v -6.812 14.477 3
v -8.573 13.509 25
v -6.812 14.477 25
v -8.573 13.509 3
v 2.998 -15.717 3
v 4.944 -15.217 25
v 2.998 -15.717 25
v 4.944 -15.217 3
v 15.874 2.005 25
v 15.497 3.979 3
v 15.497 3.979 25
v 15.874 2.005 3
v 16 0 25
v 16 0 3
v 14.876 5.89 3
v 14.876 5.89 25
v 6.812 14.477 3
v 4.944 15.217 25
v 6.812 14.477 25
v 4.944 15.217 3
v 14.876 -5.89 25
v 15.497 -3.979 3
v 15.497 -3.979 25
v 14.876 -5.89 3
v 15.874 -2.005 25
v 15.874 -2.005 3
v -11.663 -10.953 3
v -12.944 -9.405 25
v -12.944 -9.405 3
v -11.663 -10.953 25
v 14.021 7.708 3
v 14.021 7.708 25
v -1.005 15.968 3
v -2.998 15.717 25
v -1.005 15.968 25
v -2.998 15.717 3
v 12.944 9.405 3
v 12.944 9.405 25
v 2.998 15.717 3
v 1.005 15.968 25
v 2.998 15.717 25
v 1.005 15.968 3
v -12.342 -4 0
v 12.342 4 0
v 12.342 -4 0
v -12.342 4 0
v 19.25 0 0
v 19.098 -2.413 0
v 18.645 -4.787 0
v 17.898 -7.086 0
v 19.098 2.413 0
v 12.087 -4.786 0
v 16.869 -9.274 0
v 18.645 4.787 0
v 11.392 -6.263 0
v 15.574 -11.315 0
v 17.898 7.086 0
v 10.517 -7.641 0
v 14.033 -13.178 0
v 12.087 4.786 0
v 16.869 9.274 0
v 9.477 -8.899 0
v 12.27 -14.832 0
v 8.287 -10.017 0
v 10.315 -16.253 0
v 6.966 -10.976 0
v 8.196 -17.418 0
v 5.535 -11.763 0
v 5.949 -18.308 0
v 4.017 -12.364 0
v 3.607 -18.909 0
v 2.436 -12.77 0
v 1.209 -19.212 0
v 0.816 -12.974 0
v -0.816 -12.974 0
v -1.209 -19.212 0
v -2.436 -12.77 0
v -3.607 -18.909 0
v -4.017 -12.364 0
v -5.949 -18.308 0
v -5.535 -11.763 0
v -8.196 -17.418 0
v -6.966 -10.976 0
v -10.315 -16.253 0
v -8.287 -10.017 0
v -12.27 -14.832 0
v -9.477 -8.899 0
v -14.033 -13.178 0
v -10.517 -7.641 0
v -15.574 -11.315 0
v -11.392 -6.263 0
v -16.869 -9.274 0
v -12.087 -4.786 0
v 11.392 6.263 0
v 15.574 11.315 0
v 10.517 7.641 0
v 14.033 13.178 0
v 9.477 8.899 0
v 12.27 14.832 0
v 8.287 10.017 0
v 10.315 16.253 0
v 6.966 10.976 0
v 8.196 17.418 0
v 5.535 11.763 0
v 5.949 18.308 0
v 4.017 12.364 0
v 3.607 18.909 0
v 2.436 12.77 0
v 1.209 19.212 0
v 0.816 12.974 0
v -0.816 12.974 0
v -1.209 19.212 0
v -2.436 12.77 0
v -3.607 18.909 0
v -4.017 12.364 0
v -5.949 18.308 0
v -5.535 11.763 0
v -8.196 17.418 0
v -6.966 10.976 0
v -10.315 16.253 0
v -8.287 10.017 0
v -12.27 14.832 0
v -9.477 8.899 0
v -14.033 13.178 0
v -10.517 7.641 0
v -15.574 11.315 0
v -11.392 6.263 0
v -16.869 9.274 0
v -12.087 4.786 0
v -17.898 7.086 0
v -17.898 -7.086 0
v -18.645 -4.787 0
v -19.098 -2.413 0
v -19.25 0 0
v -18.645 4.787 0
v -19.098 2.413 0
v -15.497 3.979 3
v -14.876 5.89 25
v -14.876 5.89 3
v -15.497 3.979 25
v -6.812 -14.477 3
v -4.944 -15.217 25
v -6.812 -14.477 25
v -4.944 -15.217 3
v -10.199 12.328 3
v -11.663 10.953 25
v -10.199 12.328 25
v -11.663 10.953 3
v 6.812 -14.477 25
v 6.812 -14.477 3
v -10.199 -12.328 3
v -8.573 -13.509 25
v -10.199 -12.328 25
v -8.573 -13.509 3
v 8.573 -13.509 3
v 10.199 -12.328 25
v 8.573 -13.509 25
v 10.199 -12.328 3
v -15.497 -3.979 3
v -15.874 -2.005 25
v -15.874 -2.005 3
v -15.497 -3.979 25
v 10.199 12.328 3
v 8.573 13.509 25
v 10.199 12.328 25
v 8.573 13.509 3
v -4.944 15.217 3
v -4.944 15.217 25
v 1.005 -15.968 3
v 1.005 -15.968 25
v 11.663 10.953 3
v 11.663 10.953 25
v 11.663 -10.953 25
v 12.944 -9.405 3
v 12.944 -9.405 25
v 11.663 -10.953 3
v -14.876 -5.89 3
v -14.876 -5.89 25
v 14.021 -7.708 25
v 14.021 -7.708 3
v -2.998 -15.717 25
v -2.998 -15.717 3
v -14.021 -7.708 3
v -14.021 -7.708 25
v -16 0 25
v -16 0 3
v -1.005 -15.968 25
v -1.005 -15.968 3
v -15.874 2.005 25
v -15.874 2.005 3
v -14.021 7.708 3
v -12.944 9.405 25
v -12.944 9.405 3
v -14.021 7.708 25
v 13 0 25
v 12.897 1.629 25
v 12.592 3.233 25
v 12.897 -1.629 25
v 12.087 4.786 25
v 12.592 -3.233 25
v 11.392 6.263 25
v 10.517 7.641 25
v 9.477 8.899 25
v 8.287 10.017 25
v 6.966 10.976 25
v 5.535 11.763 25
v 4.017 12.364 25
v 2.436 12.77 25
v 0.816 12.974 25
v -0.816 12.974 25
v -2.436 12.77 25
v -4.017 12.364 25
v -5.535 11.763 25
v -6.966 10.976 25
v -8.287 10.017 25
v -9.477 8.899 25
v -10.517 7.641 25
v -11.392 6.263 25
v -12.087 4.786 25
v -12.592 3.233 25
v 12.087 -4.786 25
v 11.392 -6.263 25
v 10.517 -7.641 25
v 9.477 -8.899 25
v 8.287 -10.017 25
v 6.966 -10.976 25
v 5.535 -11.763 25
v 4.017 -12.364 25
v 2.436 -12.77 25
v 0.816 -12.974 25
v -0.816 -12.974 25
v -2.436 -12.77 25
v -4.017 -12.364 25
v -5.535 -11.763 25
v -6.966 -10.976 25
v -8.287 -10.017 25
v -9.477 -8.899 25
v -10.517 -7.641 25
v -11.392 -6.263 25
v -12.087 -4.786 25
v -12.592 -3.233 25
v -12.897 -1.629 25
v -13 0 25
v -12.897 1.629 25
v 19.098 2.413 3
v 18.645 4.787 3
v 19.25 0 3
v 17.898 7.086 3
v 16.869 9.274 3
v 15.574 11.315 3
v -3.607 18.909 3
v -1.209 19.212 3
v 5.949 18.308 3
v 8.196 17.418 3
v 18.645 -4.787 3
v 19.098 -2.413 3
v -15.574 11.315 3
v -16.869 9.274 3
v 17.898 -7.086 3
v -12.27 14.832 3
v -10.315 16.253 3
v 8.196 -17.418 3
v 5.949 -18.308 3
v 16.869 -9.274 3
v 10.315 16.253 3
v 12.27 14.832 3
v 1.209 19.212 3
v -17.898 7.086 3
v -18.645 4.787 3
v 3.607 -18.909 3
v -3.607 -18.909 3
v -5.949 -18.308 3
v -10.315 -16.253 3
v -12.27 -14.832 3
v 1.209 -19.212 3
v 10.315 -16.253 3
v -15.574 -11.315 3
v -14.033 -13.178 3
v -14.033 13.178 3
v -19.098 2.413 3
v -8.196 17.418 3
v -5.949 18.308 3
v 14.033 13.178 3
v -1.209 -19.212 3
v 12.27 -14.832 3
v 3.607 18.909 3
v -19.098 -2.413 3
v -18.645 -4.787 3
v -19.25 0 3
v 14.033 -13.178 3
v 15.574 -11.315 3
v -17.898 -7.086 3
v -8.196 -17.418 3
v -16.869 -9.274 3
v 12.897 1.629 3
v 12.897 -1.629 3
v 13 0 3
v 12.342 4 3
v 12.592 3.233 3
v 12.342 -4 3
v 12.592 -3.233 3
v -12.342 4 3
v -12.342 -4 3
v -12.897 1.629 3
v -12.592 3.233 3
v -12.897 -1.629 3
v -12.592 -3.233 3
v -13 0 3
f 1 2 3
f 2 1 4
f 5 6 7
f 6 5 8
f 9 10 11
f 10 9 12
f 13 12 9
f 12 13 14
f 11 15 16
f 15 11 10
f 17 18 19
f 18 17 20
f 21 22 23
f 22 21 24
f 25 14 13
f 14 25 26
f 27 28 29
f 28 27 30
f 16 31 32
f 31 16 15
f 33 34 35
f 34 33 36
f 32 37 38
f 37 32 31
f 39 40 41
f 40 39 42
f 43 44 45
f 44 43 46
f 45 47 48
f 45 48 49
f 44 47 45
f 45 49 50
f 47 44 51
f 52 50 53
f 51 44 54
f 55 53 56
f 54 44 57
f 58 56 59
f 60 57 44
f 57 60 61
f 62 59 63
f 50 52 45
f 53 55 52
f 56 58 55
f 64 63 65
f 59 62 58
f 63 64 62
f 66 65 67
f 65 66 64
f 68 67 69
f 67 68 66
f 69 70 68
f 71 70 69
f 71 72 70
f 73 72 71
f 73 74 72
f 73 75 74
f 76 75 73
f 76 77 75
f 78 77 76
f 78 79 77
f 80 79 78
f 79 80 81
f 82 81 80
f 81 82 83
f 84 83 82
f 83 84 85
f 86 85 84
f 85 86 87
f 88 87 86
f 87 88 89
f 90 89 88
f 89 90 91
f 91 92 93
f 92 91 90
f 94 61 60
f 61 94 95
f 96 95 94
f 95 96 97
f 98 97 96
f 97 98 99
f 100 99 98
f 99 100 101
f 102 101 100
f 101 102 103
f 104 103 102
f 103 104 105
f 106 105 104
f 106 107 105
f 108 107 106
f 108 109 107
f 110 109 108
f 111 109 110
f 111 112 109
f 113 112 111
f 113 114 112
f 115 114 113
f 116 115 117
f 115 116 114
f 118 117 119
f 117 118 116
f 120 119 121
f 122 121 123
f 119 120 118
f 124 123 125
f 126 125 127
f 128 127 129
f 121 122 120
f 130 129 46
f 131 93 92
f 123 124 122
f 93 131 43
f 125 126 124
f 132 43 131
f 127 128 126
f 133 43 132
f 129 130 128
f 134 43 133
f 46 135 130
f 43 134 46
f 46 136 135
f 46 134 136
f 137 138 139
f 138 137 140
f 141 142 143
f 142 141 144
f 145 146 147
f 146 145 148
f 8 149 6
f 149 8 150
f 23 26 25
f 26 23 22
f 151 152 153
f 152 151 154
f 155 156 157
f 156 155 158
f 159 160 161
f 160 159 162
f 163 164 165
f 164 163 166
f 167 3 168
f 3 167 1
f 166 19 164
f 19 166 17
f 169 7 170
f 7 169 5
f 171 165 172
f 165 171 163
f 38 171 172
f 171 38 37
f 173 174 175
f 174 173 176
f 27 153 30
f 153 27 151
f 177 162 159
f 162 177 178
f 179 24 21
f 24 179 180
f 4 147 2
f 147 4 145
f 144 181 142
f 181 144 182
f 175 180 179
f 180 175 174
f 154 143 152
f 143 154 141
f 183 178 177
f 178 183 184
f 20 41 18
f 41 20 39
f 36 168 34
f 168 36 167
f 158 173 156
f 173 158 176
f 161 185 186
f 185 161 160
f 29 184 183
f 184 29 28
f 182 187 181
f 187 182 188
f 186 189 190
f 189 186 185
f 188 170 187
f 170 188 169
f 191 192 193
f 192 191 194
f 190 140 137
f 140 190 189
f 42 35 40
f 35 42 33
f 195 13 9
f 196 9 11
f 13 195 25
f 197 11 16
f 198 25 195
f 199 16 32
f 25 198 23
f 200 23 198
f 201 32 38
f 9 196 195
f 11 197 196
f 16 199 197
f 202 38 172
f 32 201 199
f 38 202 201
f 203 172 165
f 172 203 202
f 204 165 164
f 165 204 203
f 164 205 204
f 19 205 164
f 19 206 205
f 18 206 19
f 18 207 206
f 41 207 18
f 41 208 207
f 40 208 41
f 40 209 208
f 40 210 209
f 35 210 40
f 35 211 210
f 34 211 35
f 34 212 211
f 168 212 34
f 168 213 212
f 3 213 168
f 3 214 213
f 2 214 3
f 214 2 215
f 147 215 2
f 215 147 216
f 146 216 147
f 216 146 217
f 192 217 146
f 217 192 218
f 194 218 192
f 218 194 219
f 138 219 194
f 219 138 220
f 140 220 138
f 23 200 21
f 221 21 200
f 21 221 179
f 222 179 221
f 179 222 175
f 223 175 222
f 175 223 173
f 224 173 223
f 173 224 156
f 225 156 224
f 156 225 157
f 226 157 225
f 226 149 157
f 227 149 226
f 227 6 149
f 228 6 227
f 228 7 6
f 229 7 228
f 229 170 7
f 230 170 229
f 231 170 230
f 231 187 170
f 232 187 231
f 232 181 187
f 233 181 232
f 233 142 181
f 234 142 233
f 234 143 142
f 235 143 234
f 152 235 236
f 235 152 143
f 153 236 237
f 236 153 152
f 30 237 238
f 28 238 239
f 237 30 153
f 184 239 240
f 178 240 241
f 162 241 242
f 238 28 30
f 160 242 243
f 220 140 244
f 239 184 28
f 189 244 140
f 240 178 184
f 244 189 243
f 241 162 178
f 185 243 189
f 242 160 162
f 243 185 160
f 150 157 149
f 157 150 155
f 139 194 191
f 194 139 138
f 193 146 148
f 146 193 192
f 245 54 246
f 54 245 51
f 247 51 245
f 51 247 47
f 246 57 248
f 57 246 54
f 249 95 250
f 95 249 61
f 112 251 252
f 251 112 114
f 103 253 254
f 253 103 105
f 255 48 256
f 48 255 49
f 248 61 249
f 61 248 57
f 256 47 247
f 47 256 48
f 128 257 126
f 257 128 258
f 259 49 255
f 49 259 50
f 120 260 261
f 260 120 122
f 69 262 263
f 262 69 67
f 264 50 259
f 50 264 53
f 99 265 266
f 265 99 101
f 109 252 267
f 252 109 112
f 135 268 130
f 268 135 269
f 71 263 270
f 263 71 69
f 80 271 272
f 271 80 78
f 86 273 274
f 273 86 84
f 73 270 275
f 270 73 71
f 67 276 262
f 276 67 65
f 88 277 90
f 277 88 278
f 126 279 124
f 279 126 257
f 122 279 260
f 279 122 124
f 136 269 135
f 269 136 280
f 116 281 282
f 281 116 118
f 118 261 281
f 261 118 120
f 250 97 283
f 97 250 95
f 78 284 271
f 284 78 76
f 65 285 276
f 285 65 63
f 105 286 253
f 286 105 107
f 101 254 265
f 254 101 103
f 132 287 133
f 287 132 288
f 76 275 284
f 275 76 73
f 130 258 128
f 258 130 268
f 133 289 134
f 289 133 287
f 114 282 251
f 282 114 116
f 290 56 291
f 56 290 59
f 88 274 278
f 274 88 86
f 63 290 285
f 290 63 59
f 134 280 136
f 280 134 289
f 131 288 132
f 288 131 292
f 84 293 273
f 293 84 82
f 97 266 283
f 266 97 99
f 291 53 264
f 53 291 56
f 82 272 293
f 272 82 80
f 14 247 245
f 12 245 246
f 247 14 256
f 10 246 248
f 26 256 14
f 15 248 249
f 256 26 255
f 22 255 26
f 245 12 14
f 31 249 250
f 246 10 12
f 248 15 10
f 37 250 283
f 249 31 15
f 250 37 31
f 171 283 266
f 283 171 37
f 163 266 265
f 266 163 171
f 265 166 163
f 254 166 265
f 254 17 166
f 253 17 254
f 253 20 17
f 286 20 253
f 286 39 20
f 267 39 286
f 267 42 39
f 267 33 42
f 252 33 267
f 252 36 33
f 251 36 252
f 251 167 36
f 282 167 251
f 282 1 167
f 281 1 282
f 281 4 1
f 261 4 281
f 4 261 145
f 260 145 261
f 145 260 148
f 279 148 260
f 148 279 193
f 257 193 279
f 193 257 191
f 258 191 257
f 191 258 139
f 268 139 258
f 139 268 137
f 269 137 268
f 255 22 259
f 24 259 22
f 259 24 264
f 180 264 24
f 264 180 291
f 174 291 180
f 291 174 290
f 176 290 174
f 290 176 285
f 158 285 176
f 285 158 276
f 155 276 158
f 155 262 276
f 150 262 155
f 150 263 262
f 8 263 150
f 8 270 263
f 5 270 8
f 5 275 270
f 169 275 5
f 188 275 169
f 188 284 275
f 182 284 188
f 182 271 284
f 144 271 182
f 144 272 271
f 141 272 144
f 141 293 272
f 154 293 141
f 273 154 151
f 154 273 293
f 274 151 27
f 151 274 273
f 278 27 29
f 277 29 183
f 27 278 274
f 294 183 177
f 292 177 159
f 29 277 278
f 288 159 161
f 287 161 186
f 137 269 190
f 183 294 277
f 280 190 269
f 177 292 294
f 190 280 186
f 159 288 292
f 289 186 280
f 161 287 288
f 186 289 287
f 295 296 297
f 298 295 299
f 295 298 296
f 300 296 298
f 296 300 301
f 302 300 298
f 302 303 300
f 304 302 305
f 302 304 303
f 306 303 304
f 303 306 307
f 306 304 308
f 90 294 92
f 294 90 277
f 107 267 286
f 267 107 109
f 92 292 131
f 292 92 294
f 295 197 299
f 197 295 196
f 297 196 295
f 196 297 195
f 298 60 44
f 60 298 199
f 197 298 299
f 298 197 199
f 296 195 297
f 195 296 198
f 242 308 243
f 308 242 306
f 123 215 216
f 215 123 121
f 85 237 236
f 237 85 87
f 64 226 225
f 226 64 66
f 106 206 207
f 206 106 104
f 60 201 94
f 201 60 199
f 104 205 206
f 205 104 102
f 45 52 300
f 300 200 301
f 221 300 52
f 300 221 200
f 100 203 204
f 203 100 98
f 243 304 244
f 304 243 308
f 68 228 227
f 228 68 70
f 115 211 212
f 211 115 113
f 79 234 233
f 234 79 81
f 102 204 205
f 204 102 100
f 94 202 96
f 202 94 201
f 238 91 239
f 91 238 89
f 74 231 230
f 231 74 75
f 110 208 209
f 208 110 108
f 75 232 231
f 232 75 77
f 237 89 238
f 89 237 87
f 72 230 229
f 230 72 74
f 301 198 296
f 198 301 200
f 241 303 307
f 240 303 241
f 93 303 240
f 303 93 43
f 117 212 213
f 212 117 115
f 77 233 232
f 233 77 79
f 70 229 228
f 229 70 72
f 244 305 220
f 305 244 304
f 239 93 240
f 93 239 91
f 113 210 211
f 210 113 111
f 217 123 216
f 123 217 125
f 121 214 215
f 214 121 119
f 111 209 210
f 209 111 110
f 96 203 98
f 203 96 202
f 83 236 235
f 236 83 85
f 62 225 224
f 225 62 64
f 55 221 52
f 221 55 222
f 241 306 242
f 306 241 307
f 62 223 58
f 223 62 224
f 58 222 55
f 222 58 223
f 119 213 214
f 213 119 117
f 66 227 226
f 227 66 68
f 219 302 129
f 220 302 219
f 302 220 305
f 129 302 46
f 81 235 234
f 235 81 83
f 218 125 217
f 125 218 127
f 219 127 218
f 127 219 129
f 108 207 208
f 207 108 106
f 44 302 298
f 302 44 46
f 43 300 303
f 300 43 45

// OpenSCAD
/*
    speederbike rear exaust
    
    body diameter: 1.25"
    flange diameter: .25"
*/

WALL_THICKNESS = 3;
BODY_OD = 32;               // ~ 1.25"
FLANGE_OD = BODY_OD + 6.5;  // ~0.25"

HEIGHT = 25;                // ~2"

$fn=50;

difference(){
    union(){
        cylinder(r=BODY_OD/2, h=HEIGHT);
        cylinder(r=FLANGE_OD/2, h=WALL_THICKNESS);
    }

    translate([0,0,-1]){
        cylinder(r=(BODY_OD-(WALL_THICKNESS*2))/2, h=HEIGHT+2);
    }
}

translate([-BODY_OD/2,-BODY_OD/8,0]){
   cube([BODY_OD,BODY_OD/4,WALL_THICKNESS]);
}
